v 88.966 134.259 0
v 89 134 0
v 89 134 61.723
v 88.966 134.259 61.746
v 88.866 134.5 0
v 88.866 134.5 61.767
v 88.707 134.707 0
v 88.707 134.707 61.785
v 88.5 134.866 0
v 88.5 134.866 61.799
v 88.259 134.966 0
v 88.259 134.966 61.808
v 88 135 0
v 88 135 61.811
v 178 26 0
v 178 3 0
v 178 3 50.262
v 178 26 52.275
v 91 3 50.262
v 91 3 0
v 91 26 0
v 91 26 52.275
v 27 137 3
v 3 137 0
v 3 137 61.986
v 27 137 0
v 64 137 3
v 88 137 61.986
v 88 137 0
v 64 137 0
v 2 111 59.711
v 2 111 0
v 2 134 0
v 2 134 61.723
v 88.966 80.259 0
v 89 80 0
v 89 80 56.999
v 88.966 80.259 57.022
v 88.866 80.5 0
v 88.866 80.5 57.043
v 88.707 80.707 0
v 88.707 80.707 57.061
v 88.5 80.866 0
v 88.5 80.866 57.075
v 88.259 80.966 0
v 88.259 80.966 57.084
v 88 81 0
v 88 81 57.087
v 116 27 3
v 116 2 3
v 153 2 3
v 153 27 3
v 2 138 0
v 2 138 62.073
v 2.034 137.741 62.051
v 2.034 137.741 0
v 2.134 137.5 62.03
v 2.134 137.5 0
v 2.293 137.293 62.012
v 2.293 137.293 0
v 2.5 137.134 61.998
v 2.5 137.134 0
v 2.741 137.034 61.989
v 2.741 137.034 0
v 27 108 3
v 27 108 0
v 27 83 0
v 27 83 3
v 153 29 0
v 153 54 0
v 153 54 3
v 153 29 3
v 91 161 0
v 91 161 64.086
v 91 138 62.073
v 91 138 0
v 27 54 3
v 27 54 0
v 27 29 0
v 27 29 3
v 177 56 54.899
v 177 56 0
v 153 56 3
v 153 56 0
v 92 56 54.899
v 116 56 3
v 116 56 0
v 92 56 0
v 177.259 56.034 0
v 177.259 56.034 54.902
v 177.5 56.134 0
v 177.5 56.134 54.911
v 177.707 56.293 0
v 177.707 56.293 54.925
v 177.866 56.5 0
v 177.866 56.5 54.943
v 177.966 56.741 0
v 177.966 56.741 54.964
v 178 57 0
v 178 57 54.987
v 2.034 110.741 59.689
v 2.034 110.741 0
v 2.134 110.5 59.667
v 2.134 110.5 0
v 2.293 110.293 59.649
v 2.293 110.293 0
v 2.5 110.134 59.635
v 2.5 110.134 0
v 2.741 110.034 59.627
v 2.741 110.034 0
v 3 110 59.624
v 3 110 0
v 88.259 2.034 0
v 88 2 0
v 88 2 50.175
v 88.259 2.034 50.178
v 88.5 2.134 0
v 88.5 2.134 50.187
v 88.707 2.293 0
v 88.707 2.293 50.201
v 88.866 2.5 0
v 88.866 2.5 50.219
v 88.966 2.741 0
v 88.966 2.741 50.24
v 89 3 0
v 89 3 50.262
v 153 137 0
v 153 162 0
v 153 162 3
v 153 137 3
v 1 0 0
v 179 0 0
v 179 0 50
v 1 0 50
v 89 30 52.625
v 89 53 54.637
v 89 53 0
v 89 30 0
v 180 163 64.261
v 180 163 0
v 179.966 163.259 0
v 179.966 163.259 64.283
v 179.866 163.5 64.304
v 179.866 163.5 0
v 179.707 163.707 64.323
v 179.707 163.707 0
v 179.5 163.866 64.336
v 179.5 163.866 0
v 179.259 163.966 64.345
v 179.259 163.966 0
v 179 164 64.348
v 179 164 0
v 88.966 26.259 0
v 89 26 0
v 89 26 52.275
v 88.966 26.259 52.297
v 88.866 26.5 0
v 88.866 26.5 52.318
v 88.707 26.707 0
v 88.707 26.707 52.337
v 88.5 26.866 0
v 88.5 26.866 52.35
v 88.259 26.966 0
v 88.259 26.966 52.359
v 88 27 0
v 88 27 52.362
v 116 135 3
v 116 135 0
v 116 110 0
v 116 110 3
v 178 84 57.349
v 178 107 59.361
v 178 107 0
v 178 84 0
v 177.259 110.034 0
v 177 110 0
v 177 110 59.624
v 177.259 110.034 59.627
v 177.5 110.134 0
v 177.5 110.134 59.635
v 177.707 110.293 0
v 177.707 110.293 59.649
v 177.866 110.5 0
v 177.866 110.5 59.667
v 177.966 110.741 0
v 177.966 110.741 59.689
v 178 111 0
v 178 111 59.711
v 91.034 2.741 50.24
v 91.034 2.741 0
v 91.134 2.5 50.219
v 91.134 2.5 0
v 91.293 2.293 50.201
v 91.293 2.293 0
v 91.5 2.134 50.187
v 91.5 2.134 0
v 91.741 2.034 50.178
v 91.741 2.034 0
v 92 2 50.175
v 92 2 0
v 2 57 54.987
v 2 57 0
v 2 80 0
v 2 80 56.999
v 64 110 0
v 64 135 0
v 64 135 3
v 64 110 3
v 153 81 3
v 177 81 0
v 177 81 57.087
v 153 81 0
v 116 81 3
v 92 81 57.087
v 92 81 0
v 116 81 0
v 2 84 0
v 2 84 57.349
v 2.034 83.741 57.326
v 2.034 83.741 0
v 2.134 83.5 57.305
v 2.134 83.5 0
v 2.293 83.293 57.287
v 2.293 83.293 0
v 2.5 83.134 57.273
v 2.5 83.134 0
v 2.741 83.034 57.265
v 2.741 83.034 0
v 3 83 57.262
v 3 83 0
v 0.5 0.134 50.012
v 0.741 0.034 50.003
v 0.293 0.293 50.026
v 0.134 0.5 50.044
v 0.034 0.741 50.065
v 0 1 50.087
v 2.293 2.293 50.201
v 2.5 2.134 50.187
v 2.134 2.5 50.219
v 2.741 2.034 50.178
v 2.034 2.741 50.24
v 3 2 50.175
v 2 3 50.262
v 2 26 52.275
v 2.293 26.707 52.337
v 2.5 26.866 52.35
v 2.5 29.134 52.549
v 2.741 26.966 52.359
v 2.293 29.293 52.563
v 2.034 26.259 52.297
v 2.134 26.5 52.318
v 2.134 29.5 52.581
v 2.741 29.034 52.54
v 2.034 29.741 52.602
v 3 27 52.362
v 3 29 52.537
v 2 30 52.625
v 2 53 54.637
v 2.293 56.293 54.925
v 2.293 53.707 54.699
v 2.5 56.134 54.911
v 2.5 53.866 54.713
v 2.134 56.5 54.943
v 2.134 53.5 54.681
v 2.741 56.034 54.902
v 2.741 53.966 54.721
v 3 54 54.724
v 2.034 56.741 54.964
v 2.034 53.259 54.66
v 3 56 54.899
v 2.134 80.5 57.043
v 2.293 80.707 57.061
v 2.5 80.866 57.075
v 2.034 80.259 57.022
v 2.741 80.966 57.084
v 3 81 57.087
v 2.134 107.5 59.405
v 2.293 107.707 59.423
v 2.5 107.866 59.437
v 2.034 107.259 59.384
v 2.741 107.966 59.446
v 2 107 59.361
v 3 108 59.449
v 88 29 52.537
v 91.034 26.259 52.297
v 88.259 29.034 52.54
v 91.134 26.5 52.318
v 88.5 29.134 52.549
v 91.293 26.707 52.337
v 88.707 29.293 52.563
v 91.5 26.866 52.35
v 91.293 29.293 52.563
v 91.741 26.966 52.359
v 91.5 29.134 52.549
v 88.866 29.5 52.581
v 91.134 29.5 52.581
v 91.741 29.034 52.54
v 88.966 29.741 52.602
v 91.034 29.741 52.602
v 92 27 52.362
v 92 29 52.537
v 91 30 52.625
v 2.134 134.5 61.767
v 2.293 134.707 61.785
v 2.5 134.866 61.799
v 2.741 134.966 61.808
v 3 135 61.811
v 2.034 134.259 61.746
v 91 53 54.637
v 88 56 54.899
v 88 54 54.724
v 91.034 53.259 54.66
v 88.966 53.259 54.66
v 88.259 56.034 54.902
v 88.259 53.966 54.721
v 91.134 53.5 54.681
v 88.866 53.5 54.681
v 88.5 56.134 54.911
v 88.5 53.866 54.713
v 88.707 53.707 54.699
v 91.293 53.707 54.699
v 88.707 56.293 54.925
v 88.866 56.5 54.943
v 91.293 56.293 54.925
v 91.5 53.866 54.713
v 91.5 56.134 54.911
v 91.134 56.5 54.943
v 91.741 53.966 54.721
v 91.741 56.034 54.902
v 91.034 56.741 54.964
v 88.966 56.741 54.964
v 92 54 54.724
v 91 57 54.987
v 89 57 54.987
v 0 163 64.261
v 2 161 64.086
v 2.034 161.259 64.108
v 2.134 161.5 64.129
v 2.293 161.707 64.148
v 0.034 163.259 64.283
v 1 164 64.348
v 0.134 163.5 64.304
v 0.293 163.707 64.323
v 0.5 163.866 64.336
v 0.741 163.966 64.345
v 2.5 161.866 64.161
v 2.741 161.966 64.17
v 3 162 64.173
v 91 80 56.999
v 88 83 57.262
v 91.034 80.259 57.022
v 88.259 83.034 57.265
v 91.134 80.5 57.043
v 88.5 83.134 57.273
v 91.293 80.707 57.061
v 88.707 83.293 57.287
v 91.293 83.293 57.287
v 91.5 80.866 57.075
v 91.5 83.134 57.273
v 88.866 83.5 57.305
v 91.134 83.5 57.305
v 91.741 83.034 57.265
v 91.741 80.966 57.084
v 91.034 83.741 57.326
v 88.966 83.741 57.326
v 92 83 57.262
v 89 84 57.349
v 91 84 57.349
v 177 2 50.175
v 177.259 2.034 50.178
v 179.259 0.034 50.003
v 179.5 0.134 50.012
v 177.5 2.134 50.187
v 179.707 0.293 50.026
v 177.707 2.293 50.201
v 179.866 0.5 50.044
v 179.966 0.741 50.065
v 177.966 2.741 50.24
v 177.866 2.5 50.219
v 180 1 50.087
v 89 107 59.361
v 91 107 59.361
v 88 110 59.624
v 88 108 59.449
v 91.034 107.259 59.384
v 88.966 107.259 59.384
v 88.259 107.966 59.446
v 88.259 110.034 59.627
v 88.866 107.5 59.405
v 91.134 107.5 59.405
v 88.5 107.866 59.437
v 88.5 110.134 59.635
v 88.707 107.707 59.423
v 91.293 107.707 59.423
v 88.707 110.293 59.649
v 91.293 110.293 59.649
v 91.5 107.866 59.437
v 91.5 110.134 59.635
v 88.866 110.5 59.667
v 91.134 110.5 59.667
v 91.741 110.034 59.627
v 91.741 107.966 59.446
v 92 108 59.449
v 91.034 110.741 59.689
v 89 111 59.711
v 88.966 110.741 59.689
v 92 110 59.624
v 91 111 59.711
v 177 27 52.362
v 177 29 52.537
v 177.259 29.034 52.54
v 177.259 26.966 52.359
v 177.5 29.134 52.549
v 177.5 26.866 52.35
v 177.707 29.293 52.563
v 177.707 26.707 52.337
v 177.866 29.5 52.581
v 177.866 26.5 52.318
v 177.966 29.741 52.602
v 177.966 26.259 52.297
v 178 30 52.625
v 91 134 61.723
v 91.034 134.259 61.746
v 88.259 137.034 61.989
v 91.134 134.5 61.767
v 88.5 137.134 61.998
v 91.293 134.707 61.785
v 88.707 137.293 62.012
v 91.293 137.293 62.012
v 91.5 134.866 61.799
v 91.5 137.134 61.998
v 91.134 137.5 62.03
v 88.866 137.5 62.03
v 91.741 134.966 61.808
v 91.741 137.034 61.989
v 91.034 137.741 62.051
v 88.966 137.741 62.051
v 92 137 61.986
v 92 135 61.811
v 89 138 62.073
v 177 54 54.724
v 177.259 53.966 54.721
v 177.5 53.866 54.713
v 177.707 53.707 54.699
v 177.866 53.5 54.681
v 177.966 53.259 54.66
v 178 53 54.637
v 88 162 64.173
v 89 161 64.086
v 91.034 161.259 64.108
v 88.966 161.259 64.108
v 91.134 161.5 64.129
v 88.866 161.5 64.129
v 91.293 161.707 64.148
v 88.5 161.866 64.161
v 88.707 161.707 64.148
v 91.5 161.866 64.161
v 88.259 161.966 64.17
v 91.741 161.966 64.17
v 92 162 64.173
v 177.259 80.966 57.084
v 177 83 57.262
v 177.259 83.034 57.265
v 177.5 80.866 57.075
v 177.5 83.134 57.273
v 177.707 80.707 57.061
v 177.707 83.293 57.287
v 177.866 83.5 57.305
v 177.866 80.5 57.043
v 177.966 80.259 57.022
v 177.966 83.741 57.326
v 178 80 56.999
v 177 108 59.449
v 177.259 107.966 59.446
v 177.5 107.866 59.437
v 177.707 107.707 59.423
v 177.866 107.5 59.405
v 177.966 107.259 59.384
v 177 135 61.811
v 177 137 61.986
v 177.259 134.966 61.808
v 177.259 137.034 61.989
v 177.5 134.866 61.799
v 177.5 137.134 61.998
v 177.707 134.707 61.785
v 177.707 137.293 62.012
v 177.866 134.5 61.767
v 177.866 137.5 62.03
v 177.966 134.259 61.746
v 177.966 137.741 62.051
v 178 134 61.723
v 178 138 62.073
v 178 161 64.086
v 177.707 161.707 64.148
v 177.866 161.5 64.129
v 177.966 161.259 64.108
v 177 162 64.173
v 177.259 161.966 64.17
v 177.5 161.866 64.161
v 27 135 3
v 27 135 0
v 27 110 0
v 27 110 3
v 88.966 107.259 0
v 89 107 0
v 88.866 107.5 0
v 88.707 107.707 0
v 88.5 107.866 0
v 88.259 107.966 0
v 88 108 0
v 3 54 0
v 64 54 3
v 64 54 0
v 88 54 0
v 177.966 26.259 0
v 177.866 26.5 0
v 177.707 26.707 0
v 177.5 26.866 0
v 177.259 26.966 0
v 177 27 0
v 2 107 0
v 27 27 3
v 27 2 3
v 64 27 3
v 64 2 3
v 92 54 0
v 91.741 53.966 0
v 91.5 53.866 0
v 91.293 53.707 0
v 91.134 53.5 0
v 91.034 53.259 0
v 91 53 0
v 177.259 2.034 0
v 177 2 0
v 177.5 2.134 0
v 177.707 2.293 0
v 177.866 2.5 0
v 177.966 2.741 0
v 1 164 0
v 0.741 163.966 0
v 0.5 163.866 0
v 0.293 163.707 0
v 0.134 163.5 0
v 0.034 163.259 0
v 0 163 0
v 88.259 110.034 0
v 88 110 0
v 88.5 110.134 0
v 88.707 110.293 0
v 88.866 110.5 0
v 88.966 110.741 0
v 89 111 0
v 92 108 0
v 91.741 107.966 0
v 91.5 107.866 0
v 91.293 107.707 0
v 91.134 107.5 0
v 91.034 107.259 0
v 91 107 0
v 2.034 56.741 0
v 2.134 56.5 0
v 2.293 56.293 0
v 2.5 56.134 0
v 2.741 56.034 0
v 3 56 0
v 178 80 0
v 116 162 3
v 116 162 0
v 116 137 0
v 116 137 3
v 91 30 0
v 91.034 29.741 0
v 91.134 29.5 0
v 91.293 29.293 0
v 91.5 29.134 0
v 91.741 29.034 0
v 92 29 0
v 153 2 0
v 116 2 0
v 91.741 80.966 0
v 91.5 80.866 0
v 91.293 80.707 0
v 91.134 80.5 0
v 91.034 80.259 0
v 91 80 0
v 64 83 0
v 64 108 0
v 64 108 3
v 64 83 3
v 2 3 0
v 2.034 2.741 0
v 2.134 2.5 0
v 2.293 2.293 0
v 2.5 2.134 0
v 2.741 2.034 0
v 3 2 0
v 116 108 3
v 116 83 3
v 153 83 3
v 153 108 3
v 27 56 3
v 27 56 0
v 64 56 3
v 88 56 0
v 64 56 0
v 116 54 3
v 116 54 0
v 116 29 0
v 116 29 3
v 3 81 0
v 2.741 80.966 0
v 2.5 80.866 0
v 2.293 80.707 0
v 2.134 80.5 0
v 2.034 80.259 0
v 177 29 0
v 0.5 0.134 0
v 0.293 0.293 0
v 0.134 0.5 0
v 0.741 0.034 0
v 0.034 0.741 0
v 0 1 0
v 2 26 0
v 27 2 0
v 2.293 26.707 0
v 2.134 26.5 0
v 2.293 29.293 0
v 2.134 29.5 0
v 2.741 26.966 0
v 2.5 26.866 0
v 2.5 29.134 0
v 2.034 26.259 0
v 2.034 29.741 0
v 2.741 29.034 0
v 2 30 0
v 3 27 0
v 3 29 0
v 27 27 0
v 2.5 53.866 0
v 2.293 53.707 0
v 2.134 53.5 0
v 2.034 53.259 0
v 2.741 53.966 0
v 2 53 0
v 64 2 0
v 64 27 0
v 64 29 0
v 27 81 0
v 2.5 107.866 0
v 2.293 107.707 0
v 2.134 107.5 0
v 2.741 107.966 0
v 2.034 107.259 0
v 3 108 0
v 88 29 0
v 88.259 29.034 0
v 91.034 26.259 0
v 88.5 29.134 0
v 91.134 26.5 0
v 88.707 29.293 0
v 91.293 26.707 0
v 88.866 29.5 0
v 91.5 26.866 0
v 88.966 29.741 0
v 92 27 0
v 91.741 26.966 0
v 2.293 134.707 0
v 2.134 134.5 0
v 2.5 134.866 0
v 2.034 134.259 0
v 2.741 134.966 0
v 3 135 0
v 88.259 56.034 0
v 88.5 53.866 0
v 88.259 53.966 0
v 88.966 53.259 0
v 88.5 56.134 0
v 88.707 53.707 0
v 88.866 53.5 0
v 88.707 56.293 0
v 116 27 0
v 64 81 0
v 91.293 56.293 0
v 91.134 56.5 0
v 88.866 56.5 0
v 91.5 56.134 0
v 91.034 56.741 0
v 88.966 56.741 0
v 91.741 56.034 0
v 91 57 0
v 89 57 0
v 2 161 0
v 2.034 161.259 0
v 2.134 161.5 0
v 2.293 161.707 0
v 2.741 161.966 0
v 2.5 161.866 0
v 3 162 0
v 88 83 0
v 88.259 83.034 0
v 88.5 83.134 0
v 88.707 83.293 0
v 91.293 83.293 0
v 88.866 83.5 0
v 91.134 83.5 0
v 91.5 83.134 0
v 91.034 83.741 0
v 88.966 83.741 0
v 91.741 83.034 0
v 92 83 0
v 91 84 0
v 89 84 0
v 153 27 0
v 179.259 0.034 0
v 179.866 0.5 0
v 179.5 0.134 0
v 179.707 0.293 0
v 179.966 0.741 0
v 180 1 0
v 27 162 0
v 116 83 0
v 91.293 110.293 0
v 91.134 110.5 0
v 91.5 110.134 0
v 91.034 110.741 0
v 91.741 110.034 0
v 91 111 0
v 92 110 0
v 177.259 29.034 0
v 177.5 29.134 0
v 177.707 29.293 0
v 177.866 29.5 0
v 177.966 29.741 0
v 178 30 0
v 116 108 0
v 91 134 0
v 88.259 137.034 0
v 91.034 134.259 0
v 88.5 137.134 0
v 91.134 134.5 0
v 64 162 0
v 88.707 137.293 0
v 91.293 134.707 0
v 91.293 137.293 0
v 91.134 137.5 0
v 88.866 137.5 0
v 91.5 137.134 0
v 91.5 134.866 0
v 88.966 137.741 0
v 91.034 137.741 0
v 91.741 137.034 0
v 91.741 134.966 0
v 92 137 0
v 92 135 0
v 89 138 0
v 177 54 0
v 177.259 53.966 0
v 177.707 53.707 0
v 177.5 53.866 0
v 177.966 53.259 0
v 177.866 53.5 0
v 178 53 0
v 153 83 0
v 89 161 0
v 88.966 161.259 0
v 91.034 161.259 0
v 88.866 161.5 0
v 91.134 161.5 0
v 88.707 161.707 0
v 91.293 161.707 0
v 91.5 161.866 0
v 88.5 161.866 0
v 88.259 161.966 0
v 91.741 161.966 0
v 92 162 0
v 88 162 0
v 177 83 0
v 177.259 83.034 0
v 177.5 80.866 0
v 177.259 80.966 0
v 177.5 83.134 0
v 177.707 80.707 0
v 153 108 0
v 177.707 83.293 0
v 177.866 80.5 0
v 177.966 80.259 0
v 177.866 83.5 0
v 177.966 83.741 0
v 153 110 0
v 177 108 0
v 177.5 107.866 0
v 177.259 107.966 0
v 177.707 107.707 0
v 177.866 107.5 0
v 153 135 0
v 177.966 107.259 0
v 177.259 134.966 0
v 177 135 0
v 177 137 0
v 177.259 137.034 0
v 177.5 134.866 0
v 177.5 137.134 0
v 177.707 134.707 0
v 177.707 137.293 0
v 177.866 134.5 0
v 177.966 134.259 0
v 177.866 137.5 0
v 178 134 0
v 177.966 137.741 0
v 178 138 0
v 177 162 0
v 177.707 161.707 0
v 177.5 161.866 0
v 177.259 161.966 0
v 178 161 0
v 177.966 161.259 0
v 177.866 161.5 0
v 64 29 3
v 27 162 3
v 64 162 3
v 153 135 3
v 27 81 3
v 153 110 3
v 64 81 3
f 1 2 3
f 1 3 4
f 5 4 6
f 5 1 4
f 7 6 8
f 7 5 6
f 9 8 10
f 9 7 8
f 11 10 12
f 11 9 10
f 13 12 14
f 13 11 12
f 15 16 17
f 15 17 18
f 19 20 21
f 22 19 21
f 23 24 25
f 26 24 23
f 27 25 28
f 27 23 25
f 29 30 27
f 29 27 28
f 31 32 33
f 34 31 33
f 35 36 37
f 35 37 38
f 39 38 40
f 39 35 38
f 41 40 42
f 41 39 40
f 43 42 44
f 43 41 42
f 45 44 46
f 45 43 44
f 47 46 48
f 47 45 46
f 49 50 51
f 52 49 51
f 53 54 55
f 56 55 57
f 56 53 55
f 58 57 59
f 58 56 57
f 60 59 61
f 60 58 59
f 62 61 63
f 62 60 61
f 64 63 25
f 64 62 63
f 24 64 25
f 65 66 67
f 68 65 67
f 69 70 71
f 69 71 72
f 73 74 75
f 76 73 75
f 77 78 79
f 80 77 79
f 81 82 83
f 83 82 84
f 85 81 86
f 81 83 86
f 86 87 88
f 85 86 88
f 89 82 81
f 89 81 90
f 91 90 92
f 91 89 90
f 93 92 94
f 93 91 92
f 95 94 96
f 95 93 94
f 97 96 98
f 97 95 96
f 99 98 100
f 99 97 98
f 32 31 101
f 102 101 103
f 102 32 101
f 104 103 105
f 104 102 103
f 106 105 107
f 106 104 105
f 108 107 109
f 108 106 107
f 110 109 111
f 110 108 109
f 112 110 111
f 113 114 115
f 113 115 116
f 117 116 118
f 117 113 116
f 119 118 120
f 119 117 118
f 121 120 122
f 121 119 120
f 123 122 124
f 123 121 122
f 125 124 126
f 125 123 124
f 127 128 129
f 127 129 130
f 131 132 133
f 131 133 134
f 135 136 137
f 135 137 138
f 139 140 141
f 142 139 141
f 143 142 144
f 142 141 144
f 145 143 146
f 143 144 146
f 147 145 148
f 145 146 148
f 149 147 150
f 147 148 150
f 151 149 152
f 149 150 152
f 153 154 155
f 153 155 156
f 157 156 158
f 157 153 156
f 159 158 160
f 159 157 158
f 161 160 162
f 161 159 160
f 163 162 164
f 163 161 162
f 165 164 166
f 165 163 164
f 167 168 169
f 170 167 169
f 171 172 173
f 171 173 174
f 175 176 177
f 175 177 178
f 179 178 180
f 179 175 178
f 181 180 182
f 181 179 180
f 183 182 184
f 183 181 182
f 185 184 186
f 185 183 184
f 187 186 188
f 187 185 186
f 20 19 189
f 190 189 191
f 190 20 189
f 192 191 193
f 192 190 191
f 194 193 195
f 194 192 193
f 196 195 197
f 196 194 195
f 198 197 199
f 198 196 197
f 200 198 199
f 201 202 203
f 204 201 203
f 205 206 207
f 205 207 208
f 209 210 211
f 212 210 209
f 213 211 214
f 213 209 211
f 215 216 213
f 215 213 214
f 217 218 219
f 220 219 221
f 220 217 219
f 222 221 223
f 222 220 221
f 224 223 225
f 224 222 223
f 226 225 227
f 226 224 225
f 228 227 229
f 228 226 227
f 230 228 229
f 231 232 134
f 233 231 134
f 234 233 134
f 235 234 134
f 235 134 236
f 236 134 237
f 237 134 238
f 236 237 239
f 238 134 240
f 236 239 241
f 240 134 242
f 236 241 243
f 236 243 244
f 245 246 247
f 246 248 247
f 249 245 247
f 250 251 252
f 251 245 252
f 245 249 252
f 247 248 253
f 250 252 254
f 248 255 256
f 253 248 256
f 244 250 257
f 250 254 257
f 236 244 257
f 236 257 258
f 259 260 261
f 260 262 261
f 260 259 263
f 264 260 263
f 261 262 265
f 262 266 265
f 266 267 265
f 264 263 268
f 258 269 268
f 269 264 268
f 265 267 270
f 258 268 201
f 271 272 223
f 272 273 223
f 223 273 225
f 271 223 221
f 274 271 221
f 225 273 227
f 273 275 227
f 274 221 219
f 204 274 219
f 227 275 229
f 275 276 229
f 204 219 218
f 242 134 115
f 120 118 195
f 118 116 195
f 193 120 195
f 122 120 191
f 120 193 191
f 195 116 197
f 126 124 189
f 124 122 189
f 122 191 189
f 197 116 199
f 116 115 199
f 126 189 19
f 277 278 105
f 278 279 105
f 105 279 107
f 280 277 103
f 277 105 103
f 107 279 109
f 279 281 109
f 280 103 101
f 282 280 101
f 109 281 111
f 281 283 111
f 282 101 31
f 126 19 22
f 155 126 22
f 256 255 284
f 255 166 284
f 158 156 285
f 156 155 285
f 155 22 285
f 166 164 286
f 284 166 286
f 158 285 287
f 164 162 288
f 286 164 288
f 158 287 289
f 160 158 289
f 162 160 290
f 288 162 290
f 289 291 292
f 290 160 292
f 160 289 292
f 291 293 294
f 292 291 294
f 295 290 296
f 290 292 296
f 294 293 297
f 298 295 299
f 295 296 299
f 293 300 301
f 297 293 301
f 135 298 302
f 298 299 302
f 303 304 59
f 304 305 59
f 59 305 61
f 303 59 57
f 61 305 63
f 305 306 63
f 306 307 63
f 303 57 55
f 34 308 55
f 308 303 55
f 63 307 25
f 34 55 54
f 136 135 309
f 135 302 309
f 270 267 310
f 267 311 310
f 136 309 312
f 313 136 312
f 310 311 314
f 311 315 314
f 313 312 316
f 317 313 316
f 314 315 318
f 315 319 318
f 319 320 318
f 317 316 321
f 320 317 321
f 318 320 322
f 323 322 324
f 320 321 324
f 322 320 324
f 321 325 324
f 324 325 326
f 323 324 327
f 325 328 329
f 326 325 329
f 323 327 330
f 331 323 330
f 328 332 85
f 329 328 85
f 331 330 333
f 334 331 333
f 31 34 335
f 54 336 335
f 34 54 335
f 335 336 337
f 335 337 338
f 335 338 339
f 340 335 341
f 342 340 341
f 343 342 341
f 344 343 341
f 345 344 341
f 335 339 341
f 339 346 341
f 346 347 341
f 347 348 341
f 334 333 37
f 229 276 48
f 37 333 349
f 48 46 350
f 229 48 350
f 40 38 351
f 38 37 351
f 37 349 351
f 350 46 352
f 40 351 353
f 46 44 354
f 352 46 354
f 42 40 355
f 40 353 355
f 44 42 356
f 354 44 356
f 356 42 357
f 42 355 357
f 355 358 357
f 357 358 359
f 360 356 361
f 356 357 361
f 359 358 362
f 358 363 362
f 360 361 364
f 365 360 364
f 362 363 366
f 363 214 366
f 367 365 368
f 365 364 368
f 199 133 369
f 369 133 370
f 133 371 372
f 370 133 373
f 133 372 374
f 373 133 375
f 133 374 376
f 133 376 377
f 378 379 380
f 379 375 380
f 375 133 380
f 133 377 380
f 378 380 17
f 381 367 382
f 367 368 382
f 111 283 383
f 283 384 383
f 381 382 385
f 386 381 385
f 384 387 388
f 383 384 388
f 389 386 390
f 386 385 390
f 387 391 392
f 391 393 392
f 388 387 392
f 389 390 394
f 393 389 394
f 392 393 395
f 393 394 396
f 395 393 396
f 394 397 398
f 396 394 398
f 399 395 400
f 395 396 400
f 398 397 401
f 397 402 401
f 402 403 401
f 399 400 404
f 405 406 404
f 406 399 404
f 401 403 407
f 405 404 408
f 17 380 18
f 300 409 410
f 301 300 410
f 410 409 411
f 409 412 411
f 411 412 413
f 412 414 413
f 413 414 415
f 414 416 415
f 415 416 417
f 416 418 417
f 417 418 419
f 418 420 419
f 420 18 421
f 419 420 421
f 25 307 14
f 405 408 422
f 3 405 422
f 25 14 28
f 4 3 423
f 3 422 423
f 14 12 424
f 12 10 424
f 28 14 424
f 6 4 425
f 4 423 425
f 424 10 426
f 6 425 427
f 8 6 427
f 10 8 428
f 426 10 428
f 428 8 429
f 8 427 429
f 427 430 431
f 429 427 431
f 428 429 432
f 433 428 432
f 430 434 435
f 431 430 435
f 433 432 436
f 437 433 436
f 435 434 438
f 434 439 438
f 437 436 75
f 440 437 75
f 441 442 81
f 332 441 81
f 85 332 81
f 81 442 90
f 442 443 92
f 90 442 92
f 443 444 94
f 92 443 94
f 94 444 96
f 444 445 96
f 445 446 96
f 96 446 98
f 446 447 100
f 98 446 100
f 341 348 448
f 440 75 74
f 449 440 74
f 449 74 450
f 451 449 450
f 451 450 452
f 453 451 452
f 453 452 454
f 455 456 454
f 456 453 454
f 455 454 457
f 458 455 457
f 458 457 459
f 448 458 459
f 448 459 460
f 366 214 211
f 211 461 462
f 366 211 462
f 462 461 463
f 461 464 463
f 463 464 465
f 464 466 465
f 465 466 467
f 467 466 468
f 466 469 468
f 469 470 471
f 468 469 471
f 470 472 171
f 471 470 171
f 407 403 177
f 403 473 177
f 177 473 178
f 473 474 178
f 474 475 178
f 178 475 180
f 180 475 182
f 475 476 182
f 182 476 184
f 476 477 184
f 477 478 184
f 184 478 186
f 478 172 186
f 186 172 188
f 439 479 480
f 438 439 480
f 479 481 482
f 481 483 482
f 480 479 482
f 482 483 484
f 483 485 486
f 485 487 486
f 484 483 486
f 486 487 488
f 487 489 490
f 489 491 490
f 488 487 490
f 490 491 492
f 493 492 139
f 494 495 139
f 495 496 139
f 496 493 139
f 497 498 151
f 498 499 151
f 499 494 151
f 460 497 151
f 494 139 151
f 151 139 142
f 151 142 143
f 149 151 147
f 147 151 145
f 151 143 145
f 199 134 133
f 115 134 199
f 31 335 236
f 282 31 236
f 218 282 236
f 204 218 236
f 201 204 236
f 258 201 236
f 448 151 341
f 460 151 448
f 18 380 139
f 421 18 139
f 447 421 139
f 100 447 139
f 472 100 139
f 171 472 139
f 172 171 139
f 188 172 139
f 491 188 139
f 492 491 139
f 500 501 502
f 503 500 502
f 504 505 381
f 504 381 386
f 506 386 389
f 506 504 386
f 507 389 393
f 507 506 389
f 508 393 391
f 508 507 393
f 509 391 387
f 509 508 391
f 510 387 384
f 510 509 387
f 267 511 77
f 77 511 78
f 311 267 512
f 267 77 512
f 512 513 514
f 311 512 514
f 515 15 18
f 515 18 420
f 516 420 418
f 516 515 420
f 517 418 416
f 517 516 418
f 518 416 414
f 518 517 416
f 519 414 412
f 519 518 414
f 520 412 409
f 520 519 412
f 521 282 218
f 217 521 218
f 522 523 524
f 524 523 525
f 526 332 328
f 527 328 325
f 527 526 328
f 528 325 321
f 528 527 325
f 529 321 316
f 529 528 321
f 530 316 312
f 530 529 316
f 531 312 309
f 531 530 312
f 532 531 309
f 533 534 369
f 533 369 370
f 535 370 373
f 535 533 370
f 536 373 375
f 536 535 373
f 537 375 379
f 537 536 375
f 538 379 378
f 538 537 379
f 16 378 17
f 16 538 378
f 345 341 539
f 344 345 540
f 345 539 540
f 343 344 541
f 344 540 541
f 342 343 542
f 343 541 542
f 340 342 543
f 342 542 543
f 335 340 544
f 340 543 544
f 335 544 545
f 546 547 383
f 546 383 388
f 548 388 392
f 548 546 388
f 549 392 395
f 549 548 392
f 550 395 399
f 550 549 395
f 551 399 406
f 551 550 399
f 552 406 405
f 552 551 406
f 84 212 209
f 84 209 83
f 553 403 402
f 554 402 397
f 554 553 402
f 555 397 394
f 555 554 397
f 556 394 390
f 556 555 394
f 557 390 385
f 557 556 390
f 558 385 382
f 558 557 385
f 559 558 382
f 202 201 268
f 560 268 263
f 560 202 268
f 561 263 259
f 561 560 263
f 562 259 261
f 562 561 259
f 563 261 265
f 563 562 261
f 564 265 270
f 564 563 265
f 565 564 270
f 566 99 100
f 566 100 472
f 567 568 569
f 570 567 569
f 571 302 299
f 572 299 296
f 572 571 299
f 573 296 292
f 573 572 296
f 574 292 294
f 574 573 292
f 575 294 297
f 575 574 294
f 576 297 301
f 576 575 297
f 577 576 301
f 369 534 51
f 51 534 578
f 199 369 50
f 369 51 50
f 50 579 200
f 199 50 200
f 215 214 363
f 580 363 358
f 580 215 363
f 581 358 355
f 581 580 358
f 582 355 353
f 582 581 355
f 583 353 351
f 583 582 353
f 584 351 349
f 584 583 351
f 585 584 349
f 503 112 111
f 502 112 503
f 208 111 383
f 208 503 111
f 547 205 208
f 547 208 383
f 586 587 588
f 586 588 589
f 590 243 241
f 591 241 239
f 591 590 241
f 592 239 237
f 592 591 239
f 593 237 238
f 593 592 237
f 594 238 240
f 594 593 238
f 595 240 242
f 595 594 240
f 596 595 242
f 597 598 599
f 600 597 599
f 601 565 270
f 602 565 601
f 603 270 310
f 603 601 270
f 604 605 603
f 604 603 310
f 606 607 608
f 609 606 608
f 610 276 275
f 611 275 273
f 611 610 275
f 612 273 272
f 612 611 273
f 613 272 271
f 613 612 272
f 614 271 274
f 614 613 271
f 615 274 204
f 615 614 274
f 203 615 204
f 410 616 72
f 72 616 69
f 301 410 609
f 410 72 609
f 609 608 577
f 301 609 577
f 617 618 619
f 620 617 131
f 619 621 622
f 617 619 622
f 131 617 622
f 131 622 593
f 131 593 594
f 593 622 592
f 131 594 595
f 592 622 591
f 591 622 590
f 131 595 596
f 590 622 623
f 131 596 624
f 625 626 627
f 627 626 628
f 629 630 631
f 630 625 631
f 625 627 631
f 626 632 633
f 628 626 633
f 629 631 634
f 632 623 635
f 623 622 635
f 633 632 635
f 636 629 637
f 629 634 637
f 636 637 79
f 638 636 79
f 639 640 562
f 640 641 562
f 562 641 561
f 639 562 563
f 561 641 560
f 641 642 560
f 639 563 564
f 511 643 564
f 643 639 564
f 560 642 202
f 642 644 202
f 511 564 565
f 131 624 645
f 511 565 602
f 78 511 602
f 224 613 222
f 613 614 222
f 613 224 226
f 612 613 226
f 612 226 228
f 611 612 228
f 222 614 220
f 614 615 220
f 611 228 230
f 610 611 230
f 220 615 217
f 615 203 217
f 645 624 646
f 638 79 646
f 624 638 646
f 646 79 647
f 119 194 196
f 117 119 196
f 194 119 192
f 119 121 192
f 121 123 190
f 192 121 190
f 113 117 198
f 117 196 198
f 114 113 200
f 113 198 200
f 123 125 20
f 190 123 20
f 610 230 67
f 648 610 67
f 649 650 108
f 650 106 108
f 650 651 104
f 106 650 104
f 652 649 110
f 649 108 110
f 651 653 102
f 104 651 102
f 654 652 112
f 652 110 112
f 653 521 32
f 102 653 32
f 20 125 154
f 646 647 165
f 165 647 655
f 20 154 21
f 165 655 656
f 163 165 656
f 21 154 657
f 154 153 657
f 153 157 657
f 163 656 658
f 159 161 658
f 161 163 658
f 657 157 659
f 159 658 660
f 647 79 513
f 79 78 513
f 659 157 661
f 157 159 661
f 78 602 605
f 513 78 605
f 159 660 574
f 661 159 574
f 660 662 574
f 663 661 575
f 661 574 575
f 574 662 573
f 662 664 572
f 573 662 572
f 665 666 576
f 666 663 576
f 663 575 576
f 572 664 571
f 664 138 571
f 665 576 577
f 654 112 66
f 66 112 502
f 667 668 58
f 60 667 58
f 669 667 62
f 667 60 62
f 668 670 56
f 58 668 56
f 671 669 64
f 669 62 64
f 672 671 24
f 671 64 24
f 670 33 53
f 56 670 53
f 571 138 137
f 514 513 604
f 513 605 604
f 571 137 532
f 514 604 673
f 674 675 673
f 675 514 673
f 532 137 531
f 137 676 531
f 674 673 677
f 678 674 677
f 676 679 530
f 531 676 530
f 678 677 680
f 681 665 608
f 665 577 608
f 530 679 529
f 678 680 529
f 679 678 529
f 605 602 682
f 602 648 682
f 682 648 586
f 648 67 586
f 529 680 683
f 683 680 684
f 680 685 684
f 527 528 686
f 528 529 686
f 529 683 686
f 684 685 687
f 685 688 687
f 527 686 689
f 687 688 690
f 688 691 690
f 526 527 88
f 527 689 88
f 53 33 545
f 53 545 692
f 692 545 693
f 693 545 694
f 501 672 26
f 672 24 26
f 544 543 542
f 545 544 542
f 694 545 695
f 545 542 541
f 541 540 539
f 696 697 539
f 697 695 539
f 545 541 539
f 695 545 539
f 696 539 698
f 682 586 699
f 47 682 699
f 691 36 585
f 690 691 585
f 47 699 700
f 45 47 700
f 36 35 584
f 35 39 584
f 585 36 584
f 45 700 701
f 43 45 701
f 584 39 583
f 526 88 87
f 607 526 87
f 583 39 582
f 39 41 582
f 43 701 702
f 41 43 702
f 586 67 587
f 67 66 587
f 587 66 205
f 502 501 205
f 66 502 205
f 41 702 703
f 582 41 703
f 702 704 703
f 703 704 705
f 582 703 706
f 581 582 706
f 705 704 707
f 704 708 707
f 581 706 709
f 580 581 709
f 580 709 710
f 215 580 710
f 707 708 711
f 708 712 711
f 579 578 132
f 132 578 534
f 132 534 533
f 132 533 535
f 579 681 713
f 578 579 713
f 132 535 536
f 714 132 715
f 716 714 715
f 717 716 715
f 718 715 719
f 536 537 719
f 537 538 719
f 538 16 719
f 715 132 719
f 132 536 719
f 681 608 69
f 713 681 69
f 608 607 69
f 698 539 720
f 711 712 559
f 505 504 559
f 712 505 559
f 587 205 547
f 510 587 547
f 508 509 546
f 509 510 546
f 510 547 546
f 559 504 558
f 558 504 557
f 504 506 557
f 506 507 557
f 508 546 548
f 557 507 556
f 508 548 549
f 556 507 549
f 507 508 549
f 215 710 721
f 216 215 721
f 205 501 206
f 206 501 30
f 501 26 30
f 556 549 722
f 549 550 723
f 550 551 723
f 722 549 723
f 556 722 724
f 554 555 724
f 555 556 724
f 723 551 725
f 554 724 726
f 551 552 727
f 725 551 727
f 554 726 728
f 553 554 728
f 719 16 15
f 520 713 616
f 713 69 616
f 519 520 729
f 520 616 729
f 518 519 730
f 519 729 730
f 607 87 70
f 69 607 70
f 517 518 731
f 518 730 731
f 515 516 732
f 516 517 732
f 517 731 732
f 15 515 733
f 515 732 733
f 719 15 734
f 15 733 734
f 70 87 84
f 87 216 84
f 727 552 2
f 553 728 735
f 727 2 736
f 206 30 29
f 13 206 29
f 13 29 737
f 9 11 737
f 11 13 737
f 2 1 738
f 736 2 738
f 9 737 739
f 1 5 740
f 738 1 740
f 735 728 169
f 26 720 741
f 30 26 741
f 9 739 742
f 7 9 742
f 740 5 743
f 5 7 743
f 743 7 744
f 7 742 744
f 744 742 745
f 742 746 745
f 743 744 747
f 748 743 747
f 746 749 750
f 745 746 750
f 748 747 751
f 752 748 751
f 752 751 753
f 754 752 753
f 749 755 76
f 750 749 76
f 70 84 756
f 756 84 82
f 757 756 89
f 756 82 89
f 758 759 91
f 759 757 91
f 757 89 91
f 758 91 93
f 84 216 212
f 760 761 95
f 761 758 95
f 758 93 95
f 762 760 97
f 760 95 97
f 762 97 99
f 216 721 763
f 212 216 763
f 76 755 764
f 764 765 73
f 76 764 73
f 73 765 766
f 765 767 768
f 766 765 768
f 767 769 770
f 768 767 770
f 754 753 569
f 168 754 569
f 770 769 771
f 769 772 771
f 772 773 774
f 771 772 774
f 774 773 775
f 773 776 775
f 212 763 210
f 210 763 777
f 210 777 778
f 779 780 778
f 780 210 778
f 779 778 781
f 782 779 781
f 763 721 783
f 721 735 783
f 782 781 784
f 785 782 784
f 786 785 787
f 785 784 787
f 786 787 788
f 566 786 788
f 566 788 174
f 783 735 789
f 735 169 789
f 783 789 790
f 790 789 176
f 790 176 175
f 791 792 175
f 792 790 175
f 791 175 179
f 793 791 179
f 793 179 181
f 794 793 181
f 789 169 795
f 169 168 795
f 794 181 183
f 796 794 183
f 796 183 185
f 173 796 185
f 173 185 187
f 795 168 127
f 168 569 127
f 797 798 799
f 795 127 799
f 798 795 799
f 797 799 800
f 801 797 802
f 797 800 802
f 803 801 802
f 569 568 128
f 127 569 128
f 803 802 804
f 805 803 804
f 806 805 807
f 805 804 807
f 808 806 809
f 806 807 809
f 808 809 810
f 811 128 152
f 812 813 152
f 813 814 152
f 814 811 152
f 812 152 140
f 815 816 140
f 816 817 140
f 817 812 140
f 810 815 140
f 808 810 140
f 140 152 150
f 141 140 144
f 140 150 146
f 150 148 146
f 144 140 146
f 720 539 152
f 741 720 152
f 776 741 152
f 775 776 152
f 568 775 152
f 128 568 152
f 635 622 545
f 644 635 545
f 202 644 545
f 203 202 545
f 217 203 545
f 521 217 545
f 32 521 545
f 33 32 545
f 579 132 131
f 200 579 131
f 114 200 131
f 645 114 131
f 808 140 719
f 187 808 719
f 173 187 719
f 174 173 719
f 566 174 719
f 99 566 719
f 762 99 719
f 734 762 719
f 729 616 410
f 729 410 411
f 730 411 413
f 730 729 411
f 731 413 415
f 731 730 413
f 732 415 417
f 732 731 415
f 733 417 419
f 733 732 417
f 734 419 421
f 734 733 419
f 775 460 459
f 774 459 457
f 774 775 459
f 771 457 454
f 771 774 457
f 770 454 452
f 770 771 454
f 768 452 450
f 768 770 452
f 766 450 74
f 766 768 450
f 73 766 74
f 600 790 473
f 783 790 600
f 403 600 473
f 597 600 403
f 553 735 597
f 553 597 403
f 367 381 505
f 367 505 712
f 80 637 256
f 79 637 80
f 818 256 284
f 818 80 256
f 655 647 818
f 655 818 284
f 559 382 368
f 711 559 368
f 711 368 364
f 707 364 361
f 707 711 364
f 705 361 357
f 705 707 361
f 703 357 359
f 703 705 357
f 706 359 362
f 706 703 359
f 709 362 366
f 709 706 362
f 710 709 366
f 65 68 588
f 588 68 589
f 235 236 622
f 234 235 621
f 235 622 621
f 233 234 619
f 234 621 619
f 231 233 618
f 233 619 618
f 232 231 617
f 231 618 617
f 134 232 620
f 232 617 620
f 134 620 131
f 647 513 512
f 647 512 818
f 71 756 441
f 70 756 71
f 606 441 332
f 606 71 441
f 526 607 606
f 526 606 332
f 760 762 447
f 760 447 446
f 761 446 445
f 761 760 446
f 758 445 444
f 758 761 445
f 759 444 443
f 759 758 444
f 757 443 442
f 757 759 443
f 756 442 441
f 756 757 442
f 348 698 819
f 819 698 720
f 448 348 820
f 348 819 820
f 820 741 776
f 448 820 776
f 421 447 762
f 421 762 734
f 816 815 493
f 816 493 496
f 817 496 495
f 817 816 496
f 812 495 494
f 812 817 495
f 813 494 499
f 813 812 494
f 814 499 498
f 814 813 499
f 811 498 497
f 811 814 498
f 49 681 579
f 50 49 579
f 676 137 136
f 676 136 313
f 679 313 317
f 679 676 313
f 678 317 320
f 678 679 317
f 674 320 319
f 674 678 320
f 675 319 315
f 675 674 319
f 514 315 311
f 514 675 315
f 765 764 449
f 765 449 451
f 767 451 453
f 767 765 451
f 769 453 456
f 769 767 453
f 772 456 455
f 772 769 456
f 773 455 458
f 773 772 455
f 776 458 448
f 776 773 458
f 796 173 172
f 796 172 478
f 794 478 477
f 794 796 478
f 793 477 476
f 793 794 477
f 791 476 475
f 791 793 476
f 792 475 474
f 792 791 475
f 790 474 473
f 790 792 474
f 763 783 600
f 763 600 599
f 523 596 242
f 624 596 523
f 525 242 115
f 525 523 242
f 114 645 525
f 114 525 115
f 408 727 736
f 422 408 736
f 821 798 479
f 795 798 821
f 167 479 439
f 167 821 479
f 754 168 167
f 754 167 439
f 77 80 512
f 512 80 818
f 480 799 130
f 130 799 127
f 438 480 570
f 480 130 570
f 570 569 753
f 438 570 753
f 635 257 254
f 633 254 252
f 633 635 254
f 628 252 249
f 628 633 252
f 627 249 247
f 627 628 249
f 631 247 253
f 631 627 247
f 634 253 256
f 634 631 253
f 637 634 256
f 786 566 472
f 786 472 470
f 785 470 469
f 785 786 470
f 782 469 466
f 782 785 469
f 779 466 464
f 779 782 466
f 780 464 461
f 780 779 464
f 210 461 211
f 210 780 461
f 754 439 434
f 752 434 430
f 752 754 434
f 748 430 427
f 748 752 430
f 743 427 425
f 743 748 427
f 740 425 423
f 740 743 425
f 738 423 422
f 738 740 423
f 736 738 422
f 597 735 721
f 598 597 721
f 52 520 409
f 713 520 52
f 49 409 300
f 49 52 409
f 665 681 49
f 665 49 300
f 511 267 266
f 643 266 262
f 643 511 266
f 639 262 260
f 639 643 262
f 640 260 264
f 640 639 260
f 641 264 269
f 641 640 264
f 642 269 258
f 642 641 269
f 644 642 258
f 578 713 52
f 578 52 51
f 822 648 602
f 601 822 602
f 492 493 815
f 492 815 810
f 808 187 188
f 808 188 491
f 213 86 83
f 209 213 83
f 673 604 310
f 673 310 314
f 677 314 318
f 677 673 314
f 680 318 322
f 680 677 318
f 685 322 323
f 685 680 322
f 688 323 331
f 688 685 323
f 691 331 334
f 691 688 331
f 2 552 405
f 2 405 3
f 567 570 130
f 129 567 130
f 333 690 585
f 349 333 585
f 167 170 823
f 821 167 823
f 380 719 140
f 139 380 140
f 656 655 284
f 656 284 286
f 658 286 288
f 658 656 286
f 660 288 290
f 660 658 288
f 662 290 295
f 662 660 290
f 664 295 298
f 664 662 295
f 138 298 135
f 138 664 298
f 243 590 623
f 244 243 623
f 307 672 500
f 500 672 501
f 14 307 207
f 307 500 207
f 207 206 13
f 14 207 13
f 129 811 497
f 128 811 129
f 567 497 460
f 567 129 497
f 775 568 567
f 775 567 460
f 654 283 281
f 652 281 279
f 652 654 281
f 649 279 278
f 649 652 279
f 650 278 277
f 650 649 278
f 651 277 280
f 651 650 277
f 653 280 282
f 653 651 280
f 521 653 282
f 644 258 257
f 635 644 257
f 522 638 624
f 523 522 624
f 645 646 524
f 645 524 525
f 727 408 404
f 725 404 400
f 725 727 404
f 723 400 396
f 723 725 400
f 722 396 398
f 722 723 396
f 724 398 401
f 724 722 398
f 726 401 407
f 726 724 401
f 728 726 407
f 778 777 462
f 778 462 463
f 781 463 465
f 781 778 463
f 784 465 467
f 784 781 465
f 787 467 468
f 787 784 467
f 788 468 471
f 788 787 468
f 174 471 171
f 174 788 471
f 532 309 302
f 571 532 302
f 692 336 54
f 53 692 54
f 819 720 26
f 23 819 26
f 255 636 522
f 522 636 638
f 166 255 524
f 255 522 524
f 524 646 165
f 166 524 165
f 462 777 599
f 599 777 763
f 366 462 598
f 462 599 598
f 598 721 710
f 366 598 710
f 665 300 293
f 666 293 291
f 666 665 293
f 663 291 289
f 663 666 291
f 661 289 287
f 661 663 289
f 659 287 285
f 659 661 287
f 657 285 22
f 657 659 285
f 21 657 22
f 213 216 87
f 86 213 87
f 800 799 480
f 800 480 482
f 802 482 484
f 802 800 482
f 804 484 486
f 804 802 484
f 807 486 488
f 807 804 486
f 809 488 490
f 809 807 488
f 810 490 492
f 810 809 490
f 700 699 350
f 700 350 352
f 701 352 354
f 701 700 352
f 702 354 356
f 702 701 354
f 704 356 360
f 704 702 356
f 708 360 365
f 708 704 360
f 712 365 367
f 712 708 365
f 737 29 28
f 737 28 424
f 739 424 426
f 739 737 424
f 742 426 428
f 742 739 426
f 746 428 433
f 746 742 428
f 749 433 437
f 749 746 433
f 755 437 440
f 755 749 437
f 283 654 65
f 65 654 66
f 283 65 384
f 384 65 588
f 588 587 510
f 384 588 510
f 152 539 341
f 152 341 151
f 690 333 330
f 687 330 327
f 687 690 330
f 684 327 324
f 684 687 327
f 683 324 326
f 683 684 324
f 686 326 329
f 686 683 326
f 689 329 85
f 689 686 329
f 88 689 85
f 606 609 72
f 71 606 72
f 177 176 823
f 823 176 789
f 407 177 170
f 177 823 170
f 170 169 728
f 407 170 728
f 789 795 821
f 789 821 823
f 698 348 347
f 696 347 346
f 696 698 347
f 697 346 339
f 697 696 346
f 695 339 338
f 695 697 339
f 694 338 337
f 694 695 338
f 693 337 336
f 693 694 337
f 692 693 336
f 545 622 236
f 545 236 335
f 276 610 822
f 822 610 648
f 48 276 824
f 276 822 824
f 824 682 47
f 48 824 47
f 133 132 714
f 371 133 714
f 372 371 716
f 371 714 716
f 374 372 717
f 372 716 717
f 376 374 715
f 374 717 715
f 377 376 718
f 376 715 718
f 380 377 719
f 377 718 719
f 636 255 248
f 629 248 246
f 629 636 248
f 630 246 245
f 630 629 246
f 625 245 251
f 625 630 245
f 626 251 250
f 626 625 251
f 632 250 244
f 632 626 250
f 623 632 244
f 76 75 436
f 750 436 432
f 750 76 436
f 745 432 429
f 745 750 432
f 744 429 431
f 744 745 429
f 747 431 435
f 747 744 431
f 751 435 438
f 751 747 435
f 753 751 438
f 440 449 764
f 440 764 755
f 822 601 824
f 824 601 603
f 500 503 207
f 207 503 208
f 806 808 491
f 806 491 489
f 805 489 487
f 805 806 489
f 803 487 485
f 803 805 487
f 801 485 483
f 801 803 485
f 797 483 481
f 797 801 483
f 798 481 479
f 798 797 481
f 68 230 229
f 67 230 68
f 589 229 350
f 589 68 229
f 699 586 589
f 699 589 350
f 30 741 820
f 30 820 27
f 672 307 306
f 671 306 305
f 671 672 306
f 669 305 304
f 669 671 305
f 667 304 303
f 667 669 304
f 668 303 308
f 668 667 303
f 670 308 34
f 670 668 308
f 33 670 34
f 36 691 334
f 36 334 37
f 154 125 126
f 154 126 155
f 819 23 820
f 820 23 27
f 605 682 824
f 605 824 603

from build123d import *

# Parameters (mm, degrees)
PAD_DEPTH    = 65
POCKET_DEPTH = 180.001
SKETCH002_W  = 37
SKETCH002_H  = 164
PAD001_DEPTH = 3


with BuildPart() as part:
    # Sketch → Pad (new body)
    with BuildSketch(Plane.XY):
        with BuildLine():
            ThreePointArc((1, 164), (0.292893, 163.707107), (0, 163))
            Line((0, 1), (0, 163))
            ThreePointArc((0, 1), (0.292893, 0.292893), (1, 0))
            Line((179, 0), (1, 0))
            ThreePointArc((179, 0), (179.707107, 0.292893), (180, 1))
            Line((180, 1), (180, 163))
            ThreePointArc((180, 163), (179.707107, 163.707107), (179, 164))
            Line((179, 164), (1, 164))
        make_face()
        with BuildLine():
            ThreePointArc((3, 27), (2.292893, 26.707107), (2, 26))
            Line((2, 3), (2, 26))
            ThreePointArc((2, 3), (2.292893, 2.292893), (3, 2))
            Line((3, 2), (88, 2))
            ThreePointArc((88, 2), (88.707107, 2.292893), (89, 3))
            Line((89, 3), (89, 26))
            ThreePointArc((89, 26), (88.707107, 26.707107), (88, 27))
            Line((3, 27), (88, 27))
        make_face(mode=Mode.SUBTRACT)
        with BuildLine():
            ThreePointArc((2, 30), (2.292893, 29.292893), (3, 29))
            Line((3, 29), (88, 29))
            ThreePointArc((88, 29), (88.707107, 29.292893), (89, 30))
            Line((89, 53), (89, 30))
            ThreePointArc((89, 53), (88.707107, 53.707107), (88, 54))
            Line((3, 54), (88, 54))
            ThreePointArc((3, 54), (2.292893, 53.707107), (2, 53))
            Line((2, 53), (2, 30))
        make_face(mode=Mode.SUBTRACT)
        with BuildLine():
            ThreePointArc((2, 84), (2.292893, 83.292893), (3, 83))
            Line((3, 83), (88, 83))
            ThreePointArc((88, 83), (88.707107, 83.292893), (89, 84))
            Line((89, 107), (89, 84))
            ThreePointArc((89, 107), (88.707107, 107.707107), (88, 108))
            Line((3, 108), (88, 108))
            ThreePointArc((3, 108), (2.292893, 107.707107), (2, 107))
            Line((2, 107), (2, 84))
        make_face(mode=Mode.SUBTRACT)
        with BuildLine():
            ThreePointArc((3, 81), (2.292893, 80.707107), (2, 80))
            Line((2, 57), (2, 80))
            ThreePointArc((2, 57), (2.292893, 56.292893), (3, 56))
            Line((3, 56), (88, 56))
            ThreePointArc((88, 56), (88.707107, 56.292893), (89, 57))
            Line((89, 57), (89, 80))
            ThreePointArc((89, 80), (88.707107, 80.707107), (88, 81))
            Line((3, 81), (88, 81))
        make_face(mode=Mode.SUBTRACT)
        with BuildLine():
            ThreePointArc((3, 135), (2.292893, 134.707107), (2, 134))
            Line((2, 111), (2, 134))
            ThreePointArc((2, 111), (2.292893, 110.292893), (3, 110))
            Line((3, 110), (88, 110))
            ThreePointArc((88, 110), (88.707107, 110.292893), (89, 111))
            Line((89, 111), (89, 134))
            ThreePointArc((89, 134), (88.707107, 134.707107), (88, 135))
            Line((3, 135), (88, 135))
        make_face(mode=Mode.SUBTRACT)
        with BuildLine():
            ThreePointArc((2, 138), (2.292893, 137.292893), (3, 137))
            Line((3, 137), (88, 137))
            ThreePointArc((88, 137), (88.707107, 137.292893), (89, 138))
            Line((89, 161), (89, 138))
            ThreePointArc((89, 161), (88.707107, 161.707107), (88, 162))
            Line((3, 162), (88, 162))
            ThreePointArc((3, 162), (2.292893, 161.707107), (2, 161))
            Line((2, 161), (2, 138))
        make_face(mode=Mode.SUBTRACT)
        with BuildLine():
            ThreePointArc((178, 26), (177.707107, 26.707107), (177, 27))
            Line((177, 27), (92, 27))
            ThreePointArc((92, 27), (91.292893, 26.707107), (91, 26))
            Line((91, 3), (91, 26))
            ThreePointArc((91, 3), (91.292893, 2.292893), (92, 2))
            Line((177, 2), (92, 2))
            ThreePointArc((177, 2), (177.707107, 2.292893), (178, 3))
            Line((178, 3), (178, 26))
        make_face(mode=Mode.SUBTRACT)
        with BuildLine():
            ThreePointArc((177, 29), (177.707107, 29.292893), (178, 30))
            Line((178, 53), (178, 30))
            ThreePointArc((178, 53), (177.707107, 53.707107), (177, 54))
            Line((177, 54), (92, 54))
            ThreePointArc((92, 54), (91.292893, 53.707107), (91, 53))
            Line((91, 53), (91, 30))
            ThreePointArc((91, 30), (91.292893, 29.292893), (92, 29))
            Line((177, 29), (92, 29))
        make_face(mode=Mode.SUBTRACT)
        with BuildLine():
            ThreePointArc((177, 83), (177.707107, 83.292893), (178, 84))
            Line((178, 107), (178, 84))
            ThreePointArc((178, 107), (177.707107, 107.707107), (177, 108))
            Line((177, 108), (92, 108))
            ThreePointArc((92, 108), (91.292893, 107.707107), (91, 107))
            Line((91, 107), (91, 84))
            ThreePointArc((91, 84), (91.292893, 83.292893), (92, 83))
            Line((177, 83), (92, 83))
        make_face(mode=Mode.SUBTRACT)
        with BuildLine():
            ThreePointArc((178, 80), (177.707107, 80.707107), (177, 81))
            Line((177, 81), (92, 81))
            ThreePointArc((92, 81), (91.292893, 80.707107), (91, 80))
            Line((91, 57), (91, 80))
            ThreePointArc((91, 57), (91.292893, 56.292893), (92, 56))
            Line((177, 56), (92, 56))
            ThreePointArc((177, 56), (177.707107, 56.292893), (178, 57))
            Line((178, 57), (178, 80))
        make_face(mode=Mode.SUBTRACT)
        with BuildLine():
            ThreePointArc((178, 134), (177.707107, 134.707107), (177, 135))
            Line((177, 135), (92, 135))
            ThreePointArc((92, 135), (91.292893, 134.707107), (91, 134))
            Line((91, 111), (91, 134))
            ThreePointArc((91, 111), (91.292893, 110.292893), (92, 110))
            Line((177, 110), (92, 110))
            ThreePointArc((177, 110), (177.707107, 110.292893), (178, 111))
            Line((178, 111), (178, 134))
        make_face(mode=Mode.SUBTRACT)
        with BuildLine():
            ThreePointArc((177, 137), (177.707107, 137.292893), (178, 138))
            Line((178, 161), (178, 138))
            ThreePointArc((178, 161), (177.707107, 161.707107), (177, 162))
            Line((177, 162), (92, 162))
            ThreePointArc((92, 162), (91.292893, 161.707107), (91, 161))
            Line((91, 161), (91, 138))
            ThreePointArc((91, 138), (91.292893, 137.292893), (92, 137))
            Line((177, 137), (92, 137))
        make_face(mode=Mode.SUBTRACT)
    extrude(amount=PAD_DEPTH)

    # Sketch001 (on Face2 of Pad) → Pocket (cut, through all)
    with BuildSketch(Plane.YZ.offset(180)):
        Polygon((0, 50), (202.776713, 67.740664), (191.336548, 87.155762), (-16.35232, 87.155762), align=None)
    extrude(amount=-POCKET_DEPTH, mode=Mode.SUBTRACT)

    # Sketch002 (on Face2 of Pocket) → Pad001 (join)
    with BuildSketch(Plane(origin=(0, 0, 0), x_dir=(1, 0, 0), z_dir=(0, 0, -1))):
        with Locations((45.5, -82)):
            Rectangle(SKETCH002_W, SKETCH002_H)
        with Locations((134.5, -82)):
            Rectangle(SKETCH002_W, SKETCH002_H)
    extrude(amount=-PAD001_DEPTH)


solid = part.part
